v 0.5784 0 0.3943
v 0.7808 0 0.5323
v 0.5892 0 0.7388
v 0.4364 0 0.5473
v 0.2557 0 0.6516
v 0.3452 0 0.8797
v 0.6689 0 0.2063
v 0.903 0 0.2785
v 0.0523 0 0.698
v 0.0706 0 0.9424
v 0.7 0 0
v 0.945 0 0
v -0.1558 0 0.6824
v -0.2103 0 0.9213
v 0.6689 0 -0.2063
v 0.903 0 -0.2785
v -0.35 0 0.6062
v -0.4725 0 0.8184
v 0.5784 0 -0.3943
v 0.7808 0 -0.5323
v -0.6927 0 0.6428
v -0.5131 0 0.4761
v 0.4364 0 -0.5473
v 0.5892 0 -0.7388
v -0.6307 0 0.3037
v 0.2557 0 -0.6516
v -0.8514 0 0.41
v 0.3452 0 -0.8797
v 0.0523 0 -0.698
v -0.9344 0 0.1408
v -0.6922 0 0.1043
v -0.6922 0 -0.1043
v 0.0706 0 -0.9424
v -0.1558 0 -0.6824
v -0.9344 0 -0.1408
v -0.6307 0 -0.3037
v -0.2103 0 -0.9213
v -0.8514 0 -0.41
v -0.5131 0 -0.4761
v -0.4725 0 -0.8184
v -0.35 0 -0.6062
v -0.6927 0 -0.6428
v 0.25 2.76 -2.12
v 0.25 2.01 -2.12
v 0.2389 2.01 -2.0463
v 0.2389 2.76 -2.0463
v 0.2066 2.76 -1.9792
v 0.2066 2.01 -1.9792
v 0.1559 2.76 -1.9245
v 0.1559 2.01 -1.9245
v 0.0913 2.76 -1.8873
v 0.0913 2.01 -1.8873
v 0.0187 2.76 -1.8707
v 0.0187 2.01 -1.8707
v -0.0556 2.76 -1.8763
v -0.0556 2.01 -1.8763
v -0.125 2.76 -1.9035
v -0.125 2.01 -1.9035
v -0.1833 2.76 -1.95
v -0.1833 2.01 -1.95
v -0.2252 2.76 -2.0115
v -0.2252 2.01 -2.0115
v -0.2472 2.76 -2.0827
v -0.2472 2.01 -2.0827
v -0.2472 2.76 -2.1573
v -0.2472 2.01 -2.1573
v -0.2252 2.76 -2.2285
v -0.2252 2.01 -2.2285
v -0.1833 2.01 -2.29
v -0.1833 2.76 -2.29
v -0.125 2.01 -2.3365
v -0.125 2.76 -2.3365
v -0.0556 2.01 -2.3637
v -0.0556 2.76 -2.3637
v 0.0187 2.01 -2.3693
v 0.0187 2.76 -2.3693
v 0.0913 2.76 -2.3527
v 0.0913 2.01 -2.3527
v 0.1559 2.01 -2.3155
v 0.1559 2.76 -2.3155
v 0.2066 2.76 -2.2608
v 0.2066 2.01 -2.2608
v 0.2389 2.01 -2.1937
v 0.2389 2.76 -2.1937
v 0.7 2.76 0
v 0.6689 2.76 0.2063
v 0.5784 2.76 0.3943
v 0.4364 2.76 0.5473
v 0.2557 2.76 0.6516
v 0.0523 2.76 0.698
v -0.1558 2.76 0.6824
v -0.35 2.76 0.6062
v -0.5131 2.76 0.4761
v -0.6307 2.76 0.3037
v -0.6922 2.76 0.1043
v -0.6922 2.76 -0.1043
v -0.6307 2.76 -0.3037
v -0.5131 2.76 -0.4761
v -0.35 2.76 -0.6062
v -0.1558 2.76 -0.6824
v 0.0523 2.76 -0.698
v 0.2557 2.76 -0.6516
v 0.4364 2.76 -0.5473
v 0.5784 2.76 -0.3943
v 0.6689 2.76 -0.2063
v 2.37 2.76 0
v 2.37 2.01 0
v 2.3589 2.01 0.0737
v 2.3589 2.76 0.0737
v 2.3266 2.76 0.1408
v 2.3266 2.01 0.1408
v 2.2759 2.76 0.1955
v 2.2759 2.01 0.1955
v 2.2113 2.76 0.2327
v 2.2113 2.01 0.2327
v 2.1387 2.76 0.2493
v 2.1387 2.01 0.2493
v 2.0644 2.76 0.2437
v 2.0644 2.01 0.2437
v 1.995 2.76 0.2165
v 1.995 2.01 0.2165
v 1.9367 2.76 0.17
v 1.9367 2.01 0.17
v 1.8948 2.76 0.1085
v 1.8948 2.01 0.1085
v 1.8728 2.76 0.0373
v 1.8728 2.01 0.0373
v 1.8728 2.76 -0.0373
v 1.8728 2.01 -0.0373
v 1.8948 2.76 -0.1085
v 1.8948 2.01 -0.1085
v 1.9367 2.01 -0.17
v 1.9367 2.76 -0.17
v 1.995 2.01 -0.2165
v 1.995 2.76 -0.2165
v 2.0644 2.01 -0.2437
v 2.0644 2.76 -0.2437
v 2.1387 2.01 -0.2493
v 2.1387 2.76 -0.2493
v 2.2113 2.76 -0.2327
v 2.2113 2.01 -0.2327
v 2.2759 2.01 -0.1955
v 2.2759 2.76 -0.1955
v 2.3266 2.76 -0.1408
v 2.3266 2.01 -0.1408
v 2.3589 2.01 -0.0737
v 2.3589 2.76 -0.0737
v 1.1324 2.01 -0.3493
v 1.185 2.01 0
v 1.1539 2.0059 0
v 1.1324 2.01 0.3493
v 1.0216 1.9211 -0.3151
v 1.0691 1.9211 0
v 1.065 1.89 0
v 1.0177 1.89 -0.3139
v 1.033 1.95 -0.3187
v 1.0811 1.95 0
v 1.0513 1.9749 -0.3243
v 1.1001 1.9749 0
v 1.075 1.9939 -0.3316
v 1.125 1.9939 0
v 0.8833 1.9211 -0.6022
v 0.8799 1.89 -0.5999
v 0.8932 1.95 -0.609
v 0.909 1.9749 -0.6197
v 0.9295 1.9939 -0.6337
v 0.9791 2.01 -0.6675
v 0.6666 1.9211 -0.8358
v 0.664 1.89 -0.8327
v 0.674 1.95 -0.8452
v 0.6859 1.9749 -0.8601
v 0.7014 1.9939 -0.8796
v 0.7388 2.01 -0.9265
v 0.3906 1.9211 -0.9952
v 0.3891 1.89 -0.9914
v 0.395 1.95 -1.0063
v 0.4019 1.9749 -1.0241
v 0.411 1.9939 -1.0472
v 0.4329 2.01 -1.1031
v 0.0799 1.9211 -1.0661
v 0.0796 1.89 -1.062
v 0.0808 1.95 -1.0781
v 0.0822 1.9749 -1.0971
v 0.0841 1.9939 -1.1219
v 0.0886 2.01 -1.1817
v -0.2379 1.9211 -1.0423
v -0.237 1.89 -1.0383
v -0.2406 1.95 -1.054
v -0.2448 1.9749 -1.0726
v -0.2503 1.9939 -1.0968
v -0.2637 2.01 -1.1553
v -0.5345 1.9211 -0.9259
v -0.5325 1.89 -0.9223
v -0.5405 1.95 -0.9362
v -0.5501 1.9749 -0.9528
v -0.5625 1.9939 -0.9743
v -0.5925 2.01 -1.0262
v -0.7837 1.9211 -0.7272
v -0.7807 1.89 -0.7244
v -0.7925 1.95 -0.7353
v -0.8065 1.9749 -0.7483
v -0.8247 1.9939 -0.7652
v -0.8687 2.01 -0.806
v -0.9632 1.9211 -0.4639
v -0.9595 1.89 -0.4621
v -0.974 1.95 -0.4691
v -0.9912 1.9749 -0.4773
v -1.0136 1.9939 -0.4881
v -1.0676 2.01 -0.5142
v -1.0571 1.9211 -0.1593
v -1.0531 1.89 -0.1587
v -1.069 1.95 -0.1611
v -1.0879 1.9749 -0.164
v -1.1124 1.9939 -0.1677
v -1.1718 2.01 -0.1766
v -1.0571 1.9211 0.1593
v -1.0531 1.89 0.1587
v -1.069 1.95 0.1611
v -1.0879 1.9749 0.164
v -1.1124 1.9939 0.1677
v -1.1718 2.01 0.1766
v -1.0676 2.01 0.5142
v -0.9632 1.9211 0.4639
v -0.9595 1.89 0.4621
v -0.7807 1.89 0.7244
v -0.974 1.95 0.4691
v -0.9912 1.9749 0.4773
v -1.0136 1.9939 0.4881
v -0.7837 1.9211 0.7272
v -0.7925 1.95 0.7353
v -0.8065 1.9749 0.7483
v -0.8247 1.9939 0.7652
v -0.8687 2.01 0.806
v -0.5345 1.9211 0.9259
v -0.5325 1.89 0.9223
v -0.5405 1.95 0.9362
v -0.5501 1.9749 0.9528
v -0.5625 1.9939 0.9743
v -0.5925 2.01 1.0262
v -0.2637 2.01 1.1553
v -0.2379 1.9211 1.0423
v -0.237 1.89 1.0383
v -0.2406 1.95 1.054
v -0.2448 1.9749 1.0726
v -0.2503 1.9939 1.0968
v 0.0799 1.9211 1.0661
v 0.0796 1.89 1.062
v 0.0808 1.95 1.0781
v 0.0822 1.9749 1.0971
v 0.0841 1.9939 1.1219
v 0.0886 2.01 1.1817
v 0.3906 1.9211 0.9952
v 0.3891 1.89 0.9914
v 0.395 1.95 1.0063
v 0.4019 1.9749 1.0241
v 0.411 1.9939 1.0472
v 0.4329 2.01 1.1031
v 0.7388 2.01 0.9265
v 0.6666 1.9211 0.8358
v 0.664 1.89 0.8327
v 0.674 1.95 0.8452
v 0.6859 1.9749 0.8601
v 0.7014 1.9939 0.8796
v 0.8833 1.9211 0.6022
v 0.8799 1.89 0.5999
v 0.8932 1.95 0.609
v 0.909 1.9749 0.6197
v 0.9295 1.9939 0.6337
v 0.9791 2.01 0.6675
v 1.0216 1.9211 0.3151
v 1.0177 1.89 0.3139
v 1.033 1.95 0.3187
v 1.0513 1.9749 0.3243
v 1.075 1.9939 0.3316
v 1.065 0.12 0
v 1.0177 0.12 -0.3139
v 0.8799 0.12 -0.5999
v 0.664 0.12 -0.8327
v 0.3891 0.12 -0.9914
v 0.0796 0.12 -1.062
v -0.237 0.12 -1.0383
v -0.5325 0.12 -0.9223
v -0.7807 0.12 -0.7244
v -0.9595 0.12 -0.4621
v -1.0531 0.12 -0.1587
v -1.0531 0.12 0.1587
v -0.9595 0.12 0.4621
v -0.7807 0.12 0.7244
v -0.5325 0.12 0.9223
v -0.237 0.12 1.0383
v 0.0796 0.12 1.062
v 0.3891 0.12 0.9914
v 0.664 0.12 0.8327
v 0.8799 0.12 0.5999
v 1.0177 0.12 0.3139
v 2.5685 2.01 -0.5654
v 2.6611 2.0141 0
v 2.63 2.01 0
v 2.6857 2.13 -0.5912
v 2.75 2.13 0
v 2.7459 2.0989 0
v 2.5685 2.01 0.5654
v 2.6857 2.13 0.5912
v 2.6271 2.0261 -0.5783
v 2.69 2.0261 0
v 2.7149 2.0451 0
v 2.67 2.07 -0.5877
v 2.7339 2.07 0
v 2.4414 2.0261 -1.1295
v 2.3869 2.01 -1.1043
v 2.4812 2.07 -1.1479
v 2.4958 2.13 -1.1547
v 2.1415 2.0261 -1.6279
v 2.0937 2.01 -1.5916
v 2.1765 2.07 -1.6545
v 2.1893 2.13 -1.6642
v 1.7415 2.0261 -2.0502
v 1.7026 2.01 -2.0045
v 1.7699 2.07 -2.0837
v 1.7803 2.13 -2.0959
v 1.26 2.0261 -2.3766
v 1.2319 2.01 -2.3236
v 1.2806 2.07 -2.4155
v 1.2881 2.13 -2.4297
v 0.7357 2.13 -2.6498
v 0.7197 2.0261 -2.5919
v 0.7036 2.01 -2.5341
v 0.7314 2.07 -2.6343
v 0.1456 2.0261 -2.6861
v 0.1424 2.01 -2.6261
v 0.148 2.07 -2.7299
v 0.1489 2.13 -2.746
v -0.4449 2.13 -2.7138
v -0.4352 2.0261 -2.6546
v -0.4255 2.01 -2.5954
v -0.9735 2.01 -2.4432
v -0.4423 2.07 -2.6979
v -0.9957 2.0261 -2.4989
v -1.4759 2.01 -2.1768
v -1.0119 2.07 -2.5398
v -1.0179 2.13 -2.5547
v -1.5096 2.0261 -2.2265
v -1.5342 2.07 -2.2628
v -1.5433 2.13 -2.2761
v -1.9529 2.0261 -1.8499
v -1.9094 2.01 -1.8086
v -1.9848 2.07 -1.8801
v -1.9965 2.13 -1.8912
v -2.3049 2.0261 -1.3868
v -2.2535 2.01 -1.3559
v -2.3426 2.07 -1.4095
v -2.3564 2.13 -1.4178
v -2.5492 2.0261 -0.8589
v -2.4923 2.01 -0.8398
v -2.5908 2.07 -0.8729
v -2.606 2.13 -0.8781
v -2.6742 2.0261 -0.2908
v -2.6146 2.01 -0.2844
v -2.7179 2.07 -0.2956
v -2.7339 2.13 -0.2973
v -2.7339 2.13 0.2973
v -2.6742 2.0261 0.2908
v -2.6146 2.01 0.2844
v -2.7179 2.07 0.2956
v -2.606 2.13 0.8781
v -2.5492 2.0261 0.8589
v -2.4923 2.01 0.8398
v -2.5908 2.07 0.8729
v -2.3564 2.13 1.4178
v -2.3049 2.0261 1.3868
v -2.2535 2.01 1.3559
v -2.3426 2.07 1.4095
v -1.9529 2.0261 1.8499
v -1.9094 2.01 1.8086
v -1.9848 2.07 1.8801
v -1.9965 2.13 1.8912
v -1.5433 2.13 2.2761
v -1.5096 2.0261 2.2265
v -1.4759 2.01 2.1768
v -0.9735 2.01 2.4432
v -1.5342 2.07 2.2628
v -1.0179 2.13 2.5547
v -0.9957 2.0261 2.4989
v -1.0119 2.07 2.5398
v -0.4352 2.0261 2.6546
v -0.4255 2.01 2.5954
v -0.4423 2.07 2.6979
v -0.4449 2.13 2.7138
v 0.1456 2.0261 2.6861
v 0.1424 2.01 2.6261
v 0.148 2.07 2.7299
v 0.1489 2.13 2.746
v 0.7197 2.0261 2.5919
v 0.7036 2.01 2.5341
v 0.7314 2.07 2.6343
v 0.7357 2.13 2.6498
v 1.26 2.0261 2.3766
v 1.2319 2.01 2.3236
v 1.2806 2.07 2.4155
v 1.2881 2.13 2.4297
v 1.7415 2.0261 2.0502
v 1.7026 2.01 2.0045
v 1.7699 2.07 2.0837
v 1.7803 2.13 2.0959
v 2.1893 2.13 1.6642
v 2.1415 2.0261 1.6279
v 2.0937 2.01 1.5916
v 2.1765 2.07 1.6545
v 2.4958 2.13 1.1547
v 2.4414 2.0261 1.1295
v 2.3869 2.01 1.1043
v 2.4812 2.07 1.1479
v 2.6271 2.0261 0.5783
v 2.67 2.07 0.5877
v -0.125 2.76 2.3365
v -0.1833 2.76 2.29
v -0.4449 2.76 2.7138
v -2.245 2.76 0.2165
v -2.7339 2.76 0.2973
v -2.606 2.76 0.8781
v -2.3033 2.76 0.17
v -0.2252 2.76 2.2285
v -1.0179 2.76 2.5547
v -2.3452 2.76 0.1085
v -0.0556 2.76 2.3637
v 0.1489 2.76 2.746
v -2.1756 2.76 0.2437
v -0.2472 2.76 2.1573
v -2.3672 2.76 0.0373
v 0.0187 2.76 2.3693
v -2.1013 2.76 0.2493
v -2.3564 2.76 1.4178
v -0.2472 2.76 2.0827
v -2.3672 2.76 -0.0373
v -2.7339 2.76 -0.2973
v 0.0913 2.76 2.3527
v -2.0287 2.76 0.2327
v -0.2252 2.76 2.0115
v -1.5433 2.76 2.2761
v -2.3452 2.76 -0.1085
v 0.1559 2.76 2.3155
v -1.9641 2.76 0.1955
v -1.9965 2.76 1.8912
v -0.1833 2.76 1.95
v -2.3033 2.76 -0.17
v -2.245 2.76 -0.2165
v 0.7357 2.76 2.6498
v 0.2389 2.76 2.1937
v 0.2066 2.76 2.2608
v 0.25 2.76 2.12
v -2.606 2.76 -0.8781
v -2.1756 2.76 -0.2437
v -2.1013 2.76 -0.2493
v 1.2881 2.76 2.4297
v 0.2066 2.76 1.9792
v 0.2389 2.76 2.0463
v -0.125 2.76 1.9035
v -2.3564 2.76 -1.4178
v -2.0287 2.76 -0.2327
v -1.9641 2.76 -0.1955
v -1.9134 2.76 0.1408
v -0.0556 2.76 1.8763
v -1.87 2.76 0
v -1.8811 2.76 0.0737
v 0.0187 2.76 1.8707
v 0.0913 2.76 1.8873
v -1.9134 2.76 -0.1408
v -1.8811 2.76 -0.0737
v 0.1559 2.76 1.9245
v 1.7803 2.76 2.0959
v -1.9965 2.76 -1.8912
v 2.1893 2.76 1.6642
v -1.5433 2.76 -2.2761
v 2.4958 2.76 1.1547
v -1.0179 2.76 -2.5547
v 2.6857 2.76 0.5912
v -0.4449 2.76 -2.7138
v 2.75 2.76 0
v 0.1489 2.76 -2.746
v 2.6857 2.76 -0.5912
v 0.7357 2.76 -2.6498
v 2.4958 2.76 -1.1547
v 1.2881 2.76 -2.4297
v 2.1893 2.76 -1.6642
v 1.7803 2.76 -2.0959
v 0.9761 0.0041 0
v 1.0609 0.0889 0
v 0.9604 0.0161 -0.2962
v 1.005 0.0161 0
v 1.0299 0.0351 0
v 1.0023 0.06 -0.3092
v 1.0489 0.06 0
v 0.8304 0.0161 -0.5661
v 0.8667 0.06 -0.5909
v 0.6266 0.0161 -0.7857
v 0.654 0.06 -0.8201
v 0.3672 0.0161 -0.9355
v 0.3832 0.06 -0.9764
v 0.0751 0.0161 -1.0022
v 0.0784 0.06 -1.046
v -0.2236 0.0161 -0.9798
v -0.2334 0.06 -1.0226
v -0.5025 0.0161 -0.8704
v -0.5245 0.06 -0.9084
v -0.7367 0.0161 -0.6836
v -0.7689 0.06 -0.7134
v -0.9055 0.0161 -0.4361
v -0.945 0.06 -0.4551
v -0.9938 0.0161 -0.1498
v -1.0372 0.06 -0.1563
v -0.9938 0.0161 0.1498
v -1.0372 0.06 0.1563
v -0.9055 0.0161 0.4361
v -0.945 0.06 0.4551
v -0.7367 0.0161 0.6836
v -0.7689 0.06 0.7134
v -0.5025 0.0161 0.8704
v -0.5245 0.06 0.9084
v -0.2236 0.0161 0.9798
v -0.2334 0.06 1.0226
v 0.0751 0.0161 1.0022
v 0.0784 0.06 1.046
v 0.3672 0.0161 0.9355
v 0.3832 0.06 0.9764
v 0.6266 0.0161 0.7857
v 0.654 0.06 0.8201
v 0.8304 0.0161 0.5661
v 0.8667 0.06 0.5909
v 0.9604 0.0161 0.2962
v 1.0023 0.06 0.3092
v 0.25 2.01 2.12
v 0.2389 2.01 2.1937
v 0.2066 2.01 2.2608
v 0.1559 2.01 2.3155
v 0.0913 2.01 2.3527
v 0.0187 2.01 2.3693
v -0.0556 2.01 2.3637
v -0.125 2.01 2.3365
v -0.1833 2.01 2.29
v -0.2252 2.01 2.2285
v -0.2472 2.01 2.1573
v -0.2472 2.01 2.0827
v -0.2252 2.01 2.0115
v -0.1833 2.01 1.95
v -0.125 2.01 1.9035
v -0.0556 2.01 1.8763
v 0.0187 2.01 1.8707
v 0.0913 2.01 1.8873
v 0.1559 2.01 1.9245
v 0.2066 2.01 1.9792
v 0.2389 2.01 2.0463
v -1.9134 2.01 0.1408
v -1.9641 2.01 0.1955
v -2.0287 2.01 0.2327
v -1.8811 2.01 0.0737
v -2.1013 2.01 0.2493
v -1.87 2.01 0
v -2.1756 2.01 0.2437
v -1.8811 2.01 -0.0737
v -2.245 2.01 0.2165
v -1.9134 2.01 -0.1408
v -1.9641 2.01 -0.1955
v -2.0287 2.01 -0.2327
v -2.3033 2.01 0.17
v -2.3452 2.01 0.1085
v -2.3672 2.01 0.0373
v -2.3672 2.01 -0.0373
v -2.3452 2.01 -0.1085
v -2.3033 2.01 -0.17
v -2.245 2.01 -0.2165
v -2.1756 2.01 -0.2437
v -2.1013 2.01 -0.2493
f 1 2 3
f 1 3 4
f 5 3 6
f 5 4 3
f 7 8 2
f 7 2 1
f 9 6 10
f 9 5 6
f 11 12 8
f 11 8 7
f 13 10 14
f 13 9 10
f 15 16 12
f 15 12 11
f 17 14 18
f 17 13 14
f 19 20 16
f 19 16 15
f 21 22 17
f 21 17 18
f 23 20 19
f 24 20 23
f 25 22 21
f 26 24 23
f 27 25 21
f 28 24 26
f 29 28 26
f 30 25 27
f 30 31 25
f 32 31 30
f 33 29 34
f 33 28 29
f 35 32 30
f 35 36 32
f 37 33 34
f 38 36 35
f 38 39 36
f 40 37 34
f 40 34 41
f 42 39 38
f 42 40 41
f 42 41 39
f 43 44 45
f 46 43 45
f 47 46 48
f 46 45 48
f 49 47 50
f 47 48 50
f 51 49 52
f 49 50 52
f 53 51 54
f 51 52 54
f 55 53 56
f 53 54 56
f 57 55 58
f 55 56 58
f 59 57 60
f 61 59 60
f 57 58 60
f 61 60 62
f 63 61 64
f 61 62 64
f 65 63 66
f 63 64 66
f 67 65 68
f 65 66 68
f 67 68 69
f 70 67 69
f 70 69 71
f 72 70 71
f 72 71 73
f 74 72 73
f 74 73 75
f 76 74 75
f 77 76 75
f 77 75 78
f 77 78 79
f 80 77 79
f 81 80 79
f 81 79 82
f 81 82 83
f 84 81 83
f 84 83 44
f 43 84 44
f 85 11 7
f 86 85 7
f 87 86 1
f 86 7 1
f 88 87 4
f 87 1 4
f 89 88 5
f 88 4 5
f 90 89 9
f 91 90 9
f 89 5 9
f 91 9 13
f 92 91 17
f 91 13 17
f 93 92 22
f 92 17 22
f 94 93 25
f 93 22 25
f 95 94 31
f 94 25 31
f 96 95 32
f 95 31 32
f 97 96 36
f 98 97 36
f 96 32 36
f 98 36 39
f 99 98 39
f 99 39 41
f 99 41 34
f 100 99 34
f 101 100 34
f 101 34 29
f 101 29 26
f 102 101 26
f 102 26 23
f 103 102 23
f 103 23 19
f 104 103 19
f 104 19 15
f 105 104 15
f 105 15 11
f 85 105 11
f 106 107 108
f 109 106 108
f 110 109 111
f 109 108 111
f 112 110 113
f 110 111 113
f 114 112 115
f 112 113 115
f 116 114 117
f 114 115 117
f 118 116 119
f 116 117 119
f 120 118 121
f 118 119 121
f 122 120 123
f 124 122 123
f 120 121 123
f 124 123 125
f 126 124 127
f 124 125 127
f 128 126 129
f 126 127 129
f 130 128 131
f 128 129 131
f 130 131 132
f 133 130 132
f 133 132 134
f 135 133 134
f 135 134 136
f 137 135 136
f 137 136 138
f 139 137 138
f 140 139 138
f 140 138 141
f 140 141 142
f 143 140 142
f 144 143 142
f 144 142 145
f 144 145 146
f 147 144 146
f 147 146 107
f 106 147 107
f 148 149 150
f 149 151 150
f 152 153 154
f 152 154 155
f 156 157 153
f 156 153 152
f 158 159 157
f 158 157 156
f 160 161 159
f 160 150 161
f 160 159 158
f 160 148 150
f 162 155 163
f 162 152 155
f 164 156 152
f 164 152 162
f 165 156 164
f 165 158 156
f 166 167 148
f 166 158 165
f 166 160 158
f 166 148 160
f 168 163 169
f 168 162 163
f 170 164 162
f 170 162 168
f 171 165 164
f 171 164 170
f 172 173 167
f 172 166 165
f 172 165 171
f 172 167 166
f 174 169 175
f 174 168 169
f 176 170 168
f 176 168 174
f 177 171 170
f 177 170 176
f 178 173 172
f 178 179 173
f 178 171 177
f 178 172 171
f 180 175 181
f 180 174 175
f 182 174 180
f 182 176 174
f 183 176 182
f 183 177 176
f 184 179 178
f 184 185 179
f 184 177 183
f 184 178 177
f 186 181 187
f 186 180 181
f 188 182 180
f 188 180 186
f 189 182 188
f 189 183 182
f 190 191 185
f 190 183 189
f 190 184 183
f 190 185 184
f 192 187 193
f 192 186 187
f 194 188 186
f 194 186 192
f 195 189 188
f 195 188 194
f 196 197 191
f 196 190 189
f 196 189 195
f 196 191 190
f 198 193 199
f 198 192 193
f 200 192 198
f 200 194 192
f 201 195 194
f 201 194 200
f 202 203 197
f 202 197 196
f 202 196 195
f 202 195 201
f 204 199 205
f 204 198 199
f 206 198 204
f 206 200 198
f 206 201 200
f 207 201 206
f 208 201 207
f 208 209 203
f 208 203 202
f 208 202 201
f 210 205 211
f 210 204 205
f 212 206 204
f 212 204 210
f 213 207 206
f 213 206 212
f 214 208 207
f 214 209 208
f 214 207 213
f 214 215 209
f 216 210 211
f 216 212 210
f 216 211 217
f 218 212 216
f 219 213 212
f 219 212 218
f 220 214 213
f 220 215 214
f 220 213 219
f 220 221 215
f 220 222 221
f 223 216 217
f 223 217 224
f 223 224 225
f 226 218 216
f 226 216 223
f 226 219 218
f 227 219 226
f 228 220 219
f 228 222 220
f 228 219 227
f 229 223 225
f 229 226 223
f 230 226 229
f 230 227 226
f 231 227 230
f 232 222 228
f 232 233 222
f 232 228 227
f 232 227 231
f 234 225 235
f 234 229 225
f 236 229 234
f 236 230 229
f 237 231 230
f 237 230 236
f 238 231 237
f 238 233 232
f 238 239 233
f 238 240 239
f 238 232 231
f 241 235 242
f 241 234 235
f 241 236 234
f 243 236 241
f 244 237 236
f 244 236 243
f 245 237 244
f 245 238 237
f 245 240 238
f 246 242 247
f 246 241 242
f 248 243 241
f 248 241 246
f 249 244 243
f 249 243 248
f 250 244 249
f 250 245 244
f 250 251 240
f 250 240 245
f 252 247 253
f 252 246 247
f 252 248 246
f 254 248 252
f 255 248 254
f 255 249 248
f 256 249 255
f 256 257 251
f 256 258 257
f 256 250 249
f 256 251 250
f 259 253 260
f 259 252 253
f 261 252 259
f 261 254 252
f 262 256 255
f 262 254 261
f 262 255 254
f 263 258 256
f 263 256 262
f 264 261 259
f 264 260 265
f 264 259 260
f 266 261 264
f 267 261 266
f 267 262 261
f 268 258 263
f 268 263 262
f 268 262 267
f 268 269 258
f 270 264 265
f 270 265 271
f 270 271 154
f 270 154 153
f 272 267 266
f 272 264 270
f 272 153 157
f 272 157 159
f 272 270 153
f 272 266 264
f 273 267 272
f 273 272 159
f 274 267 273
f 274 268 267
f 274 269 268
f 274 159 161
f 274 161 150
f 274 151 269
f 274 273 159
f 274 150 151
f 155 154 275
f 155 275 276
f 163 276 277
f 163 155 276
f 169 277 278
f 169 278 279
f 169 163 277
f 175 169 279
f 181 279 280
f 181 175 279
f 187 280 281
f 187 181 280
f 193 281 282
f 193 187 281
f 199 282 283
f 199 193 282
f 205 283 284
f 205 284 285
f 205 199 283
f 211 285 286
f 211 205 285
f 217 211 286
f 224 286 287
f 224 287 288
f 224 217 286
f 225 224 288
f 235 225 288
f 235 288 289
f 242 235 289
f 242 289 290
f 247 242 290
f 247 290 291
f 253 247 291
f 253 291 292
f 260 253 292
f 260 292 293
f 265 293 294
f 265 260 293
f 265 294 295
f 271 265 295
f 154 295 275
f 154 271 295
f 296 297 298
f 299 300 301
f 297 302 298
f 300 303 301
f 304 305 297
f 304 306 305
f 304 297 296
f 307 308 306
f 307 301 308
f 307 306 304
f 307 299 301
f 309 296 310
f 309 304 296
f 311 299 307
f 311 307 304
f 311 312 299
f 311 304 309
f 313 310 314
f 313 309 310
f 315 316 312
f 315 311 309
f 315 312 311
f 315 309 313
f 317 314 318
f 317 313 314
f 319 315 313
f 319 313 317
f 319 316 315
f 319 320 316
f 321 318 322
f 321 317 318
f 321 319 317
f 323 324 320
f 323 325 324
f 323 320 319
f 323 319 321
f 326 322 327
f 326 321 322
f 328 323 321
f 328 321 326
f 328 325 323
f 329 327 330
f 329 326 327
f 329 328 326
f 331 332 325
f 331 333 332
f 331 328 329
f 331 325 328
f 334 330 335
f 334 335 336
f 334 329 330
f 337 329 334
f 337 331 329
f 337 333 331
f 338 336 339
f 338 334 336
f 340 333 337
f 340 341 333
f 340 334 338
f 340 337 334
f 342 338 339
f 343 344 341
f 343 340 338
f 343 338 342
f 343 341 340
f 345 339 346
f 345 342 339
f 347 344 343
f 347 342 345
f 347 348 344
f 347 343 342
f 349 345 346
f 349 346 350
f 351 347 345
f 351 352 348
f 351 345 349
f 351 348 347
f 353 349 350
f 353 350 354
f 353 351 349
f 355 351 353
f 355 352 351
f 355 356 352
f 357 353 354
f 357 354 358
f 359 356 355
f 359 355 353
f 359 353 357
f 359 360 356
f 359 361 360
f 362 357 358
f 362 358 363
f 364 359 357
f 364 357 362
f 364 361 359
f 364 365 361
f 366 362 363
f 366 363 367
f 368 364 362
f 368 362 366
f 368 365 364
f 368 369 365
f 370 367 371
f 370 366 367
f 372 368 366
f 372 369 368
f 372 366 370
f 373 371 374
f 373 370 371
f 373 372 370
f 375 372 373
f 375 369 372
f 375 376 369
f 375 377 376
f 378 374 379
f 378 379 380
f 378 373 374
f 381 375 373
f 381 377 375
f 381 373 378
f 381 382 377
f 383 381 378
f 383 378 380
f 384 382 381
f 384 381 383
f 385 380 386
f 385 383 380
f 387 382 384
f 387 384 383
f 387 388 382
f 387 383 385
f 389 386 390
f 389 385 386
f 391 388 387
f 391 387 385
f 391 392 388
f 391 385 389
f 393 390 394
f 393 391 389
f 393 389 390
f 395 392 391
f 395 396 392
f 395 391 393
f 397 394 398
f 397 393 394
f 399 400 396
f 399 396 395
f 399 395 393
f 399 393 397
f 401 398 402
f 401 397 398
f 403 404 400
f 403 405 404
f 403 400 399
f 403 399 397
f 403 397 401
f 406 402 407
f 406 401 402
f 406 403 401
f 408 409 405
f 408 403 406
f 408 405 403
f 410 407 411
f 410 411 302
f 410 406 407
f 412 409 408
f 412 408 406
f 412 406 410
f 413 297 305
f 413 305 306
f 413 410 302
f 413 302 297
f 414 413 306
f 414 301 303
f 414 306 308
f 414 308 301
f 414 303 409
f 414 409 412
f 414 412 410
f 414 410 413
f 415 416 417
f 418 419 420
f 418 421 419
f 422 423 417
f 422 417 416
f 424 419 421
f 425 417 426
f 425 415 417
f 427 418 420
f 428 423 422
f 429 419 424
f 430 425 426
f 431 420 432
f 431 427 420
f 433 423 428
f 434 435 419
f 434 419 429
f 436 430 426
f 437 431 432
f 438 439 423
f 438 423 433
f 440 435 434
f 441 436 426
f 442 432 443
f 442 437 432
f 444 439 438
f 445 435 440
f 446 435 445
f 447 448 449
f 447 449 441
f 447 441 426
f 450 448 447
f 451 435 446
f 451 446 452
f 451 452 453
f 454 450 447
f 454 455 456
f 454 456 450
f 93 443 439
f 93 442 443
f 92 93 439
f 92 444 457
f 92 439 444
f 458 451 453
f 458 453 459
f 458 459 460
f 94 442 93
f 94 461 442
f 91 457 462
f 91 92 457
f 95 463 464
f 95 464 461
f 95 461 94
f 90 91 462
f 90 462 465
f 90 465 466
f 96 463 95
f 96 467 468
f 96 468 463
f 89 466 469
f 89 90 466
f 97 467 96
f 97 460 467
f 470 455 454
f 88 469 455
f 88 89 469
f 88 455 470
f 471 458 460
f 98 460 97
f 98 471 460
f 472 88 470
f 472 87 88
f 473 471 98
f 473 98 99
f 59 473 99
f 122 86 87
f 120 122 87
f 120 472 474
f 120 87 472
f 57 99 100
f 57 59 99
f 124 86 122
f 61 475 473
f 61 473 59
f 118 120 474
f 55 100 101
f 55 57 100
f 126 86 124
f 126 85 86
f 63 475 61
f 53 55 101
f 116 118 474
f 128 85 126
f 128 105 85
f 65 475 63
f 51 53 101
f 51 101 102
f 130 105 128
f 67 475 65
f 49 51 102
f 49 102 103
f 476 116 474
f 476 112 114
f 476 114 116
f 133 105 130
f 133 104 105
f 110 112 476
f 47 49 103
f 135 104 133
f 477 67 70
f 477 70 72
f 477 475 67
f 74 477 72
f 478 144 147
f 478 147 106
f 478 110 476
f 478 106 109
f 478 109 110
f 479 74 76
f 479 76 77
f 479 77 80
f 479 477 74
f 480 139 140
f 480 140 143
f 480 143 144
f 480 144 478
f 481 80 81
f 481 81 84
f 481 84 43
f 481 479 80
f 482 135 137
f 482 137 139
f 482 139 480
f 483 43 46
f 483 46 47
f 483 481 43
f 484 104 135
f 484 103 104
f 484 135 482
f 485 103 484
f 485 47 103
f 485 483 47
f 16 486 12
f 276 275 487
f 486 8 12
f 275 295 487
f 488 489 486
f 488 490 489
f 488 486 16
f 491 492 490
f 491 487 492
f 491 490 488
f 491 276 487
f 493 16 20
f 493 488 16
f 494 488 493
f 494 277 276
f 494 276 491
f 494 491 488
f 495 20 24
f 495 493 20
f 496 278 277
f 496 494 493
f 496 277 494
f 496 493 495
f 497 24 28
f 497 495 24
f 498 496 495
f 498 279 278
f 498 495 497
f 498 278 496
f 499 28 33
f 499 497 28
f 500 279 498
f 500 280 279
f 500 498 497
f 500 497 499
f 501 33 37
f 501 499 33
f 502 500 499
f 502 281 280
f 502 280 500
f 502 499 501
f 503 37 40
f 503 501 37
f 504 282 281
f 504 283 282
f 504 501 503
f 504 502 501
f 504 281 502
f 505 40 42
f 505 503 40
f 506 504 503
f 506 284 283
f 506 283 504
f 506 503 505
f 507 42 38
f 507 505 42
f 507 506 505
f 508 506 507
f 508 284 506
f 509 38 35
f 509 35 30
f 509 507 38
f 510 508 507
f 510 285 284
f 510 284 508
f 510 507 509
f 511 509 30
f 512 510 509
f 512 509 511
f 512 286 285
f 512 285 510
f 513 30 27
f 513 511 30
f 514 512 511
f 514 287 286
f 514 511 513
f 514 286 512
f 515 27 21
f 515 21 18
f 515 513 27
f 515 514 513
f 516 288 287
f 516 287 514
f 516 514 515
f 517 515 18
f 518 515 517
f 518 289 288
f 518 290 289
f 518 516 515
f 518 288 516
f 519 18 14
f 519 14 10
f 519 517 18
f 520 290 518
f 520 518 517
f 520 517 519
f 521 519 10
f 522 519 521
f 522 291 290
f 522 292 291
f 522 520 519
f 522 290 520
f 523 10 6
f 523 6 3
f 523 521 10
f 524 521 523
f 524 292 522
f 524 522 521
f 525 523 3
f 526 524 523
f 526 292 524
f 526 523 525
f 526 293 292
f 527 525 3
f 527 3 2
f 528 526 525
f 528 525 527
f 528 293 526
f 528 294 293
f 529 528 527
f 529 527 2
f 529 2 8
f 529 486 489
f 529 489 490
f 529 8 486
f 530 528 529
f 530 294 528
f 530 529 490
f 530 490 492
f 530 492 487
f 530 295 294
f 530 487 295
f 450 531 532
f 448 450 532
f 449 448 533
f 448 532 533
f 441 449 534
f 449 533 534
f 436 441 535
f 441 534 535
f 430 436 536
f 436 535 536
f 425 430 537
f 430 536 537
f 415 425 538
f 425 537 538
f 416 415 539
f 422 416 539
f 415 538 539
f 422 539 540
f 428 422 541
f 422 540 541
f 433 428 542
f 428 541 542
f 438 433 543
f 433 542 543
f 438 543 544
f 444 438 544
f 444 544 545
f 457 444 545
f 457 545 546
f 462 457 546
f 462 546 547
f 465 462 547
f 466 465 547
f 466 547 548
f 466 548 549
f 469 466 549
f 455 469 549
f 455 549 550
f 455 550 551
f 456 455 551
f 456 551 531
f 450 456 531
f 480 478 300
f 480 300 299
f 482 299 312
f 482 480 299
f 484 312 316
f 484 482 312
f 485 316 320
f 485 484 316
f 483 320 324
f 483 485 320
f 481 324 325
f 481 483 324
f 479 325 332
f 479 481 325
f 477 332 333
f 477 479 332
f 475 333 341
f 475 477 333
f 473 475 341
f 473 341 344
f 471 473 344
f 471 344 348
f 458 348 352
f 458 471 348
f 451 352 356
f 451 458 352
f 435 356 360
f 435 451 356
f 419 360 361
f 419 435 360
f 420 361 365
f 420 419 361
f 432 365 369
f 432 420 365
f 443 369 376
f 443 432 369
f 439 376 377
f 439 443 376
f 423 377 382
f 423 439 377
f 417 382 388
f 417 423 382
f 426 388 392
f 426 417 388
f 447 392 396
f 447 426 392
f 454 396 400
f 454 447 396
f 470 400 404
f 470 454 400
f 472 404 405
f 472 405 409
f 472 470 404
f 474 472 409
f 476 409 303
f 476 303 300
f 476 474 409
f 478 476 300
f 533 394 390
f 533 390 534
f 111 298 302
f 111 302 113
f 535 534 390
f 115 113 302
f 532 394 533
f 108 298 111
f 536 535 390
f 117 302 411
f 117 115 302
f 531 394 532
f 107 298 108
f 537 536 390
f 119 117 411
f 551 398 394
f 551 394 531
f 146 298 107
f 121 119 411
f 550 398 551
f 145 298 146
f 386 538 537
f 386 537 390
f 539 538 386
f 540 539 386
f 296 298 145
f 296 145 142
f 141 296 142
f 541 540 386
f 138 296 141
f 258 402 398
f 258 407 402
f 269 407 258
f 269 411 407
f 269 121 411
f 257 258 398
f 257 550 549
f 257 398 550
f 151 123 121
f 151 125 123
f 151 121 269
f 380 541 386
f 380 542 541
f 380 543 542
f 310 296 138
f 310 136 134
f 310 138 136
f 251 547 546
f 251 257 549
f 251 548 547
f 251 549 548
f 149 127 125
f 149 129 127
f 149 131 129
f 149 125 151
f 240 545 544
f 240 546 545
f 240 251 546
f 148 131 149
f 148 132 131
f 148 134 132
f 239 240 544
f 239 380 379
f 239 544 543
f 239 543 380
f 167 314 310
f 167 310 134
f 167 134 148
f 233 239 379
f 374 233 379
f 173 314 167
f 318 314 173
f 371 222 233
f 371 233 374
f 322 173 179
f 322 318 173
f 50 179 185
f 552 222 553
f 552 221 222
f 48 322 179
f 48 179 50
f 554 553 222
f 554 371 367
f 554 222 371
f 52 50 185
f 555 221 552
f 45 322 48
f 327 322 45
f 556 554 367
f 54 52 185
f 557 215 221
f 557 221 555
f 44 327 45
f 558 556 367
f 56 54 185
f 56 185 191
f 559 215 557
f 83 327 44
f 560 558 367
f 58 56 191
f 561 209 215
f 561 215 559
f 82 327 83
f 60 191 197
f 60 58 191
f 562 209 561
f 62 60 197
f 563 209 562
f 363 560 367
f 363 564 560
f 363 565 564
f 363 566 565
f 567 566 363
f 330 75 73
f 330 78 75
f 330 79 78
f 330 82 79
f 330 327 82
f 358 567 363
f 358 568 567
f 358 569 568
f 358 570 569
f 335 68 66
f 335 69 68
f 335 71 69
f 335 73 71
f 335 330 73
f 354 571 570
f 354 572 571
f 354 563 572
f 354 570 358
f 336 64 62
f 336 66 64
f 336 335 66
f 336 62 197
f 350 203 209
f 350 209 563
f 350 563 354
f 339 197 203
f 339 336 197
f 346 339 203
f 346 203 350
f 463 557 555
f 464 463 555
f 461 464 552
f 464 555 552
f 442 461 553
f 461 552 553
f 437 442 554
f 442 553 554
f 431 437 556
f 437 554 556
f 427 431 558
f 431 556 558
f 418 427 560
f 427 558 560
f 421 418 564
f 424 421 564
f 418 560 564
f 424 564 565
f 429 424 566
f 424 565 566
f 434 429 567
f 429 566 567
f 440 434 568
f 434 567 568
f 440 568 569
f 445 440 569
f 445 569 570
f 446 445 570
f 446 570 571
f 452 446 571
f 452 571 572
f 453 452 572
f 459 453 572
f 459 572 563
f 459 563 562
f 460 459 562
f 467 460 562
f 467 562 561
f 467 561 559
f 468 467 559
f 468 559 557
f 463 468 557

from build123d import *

# Parameters (mm, degrees)
F2_R     = 0.7
F3_DEPTH = 2.761
F4_R     = 0.25
F5_DEPTH = 0.751
F6_R     = 0.12


with BuildPart() as f1:
    # F0 (on Top) → F1 (revolve)
    with BuildSketch(Plane.XY):
        Polygon((0, 2.76), (0, 0), (1.065, 0), (1.065, 2.01), (2.75, 2.01), (2.75, 2.76), align=None)
    revolve(axis=Axis((0, 1.38, 0), (0, 1, 0)))

    # F2 (on face) → F3 (cut, through all)
    with BuildSketch(Plane.XZ):
        Circle(F2_R)
    extrude(amount=-F3_DEPTH, mode=Mode.SUBTRACT)

    # F4 (on face) → F5 (cut, through all)
    with BuildSketch(Plane.XZ.offset(-2.01)):
        with Locations((0, 2.12)):
            Circle(F4_R)
        with Locations((2.12, 0)):
            Circle(F4_R)
        with Locations((0, -2.12)):
            Circle(F4_R)
        with Locations((-2.12, 0)):
            Circle(F4_R)
    extrude(amount=-F5_DEPTH, mode=Mode.SUBTRACT)

    # F6
    f6_edges = [f1.edges().sort_by_distance(p)[0] for p in [
        (-2.75, 2.01, 0),
        (-1.065, 2.01, 0),
        (-1.065, 0, 0),
    ]]
    fillet(f6_edges, radius=F6_R)


solid = f1.part
